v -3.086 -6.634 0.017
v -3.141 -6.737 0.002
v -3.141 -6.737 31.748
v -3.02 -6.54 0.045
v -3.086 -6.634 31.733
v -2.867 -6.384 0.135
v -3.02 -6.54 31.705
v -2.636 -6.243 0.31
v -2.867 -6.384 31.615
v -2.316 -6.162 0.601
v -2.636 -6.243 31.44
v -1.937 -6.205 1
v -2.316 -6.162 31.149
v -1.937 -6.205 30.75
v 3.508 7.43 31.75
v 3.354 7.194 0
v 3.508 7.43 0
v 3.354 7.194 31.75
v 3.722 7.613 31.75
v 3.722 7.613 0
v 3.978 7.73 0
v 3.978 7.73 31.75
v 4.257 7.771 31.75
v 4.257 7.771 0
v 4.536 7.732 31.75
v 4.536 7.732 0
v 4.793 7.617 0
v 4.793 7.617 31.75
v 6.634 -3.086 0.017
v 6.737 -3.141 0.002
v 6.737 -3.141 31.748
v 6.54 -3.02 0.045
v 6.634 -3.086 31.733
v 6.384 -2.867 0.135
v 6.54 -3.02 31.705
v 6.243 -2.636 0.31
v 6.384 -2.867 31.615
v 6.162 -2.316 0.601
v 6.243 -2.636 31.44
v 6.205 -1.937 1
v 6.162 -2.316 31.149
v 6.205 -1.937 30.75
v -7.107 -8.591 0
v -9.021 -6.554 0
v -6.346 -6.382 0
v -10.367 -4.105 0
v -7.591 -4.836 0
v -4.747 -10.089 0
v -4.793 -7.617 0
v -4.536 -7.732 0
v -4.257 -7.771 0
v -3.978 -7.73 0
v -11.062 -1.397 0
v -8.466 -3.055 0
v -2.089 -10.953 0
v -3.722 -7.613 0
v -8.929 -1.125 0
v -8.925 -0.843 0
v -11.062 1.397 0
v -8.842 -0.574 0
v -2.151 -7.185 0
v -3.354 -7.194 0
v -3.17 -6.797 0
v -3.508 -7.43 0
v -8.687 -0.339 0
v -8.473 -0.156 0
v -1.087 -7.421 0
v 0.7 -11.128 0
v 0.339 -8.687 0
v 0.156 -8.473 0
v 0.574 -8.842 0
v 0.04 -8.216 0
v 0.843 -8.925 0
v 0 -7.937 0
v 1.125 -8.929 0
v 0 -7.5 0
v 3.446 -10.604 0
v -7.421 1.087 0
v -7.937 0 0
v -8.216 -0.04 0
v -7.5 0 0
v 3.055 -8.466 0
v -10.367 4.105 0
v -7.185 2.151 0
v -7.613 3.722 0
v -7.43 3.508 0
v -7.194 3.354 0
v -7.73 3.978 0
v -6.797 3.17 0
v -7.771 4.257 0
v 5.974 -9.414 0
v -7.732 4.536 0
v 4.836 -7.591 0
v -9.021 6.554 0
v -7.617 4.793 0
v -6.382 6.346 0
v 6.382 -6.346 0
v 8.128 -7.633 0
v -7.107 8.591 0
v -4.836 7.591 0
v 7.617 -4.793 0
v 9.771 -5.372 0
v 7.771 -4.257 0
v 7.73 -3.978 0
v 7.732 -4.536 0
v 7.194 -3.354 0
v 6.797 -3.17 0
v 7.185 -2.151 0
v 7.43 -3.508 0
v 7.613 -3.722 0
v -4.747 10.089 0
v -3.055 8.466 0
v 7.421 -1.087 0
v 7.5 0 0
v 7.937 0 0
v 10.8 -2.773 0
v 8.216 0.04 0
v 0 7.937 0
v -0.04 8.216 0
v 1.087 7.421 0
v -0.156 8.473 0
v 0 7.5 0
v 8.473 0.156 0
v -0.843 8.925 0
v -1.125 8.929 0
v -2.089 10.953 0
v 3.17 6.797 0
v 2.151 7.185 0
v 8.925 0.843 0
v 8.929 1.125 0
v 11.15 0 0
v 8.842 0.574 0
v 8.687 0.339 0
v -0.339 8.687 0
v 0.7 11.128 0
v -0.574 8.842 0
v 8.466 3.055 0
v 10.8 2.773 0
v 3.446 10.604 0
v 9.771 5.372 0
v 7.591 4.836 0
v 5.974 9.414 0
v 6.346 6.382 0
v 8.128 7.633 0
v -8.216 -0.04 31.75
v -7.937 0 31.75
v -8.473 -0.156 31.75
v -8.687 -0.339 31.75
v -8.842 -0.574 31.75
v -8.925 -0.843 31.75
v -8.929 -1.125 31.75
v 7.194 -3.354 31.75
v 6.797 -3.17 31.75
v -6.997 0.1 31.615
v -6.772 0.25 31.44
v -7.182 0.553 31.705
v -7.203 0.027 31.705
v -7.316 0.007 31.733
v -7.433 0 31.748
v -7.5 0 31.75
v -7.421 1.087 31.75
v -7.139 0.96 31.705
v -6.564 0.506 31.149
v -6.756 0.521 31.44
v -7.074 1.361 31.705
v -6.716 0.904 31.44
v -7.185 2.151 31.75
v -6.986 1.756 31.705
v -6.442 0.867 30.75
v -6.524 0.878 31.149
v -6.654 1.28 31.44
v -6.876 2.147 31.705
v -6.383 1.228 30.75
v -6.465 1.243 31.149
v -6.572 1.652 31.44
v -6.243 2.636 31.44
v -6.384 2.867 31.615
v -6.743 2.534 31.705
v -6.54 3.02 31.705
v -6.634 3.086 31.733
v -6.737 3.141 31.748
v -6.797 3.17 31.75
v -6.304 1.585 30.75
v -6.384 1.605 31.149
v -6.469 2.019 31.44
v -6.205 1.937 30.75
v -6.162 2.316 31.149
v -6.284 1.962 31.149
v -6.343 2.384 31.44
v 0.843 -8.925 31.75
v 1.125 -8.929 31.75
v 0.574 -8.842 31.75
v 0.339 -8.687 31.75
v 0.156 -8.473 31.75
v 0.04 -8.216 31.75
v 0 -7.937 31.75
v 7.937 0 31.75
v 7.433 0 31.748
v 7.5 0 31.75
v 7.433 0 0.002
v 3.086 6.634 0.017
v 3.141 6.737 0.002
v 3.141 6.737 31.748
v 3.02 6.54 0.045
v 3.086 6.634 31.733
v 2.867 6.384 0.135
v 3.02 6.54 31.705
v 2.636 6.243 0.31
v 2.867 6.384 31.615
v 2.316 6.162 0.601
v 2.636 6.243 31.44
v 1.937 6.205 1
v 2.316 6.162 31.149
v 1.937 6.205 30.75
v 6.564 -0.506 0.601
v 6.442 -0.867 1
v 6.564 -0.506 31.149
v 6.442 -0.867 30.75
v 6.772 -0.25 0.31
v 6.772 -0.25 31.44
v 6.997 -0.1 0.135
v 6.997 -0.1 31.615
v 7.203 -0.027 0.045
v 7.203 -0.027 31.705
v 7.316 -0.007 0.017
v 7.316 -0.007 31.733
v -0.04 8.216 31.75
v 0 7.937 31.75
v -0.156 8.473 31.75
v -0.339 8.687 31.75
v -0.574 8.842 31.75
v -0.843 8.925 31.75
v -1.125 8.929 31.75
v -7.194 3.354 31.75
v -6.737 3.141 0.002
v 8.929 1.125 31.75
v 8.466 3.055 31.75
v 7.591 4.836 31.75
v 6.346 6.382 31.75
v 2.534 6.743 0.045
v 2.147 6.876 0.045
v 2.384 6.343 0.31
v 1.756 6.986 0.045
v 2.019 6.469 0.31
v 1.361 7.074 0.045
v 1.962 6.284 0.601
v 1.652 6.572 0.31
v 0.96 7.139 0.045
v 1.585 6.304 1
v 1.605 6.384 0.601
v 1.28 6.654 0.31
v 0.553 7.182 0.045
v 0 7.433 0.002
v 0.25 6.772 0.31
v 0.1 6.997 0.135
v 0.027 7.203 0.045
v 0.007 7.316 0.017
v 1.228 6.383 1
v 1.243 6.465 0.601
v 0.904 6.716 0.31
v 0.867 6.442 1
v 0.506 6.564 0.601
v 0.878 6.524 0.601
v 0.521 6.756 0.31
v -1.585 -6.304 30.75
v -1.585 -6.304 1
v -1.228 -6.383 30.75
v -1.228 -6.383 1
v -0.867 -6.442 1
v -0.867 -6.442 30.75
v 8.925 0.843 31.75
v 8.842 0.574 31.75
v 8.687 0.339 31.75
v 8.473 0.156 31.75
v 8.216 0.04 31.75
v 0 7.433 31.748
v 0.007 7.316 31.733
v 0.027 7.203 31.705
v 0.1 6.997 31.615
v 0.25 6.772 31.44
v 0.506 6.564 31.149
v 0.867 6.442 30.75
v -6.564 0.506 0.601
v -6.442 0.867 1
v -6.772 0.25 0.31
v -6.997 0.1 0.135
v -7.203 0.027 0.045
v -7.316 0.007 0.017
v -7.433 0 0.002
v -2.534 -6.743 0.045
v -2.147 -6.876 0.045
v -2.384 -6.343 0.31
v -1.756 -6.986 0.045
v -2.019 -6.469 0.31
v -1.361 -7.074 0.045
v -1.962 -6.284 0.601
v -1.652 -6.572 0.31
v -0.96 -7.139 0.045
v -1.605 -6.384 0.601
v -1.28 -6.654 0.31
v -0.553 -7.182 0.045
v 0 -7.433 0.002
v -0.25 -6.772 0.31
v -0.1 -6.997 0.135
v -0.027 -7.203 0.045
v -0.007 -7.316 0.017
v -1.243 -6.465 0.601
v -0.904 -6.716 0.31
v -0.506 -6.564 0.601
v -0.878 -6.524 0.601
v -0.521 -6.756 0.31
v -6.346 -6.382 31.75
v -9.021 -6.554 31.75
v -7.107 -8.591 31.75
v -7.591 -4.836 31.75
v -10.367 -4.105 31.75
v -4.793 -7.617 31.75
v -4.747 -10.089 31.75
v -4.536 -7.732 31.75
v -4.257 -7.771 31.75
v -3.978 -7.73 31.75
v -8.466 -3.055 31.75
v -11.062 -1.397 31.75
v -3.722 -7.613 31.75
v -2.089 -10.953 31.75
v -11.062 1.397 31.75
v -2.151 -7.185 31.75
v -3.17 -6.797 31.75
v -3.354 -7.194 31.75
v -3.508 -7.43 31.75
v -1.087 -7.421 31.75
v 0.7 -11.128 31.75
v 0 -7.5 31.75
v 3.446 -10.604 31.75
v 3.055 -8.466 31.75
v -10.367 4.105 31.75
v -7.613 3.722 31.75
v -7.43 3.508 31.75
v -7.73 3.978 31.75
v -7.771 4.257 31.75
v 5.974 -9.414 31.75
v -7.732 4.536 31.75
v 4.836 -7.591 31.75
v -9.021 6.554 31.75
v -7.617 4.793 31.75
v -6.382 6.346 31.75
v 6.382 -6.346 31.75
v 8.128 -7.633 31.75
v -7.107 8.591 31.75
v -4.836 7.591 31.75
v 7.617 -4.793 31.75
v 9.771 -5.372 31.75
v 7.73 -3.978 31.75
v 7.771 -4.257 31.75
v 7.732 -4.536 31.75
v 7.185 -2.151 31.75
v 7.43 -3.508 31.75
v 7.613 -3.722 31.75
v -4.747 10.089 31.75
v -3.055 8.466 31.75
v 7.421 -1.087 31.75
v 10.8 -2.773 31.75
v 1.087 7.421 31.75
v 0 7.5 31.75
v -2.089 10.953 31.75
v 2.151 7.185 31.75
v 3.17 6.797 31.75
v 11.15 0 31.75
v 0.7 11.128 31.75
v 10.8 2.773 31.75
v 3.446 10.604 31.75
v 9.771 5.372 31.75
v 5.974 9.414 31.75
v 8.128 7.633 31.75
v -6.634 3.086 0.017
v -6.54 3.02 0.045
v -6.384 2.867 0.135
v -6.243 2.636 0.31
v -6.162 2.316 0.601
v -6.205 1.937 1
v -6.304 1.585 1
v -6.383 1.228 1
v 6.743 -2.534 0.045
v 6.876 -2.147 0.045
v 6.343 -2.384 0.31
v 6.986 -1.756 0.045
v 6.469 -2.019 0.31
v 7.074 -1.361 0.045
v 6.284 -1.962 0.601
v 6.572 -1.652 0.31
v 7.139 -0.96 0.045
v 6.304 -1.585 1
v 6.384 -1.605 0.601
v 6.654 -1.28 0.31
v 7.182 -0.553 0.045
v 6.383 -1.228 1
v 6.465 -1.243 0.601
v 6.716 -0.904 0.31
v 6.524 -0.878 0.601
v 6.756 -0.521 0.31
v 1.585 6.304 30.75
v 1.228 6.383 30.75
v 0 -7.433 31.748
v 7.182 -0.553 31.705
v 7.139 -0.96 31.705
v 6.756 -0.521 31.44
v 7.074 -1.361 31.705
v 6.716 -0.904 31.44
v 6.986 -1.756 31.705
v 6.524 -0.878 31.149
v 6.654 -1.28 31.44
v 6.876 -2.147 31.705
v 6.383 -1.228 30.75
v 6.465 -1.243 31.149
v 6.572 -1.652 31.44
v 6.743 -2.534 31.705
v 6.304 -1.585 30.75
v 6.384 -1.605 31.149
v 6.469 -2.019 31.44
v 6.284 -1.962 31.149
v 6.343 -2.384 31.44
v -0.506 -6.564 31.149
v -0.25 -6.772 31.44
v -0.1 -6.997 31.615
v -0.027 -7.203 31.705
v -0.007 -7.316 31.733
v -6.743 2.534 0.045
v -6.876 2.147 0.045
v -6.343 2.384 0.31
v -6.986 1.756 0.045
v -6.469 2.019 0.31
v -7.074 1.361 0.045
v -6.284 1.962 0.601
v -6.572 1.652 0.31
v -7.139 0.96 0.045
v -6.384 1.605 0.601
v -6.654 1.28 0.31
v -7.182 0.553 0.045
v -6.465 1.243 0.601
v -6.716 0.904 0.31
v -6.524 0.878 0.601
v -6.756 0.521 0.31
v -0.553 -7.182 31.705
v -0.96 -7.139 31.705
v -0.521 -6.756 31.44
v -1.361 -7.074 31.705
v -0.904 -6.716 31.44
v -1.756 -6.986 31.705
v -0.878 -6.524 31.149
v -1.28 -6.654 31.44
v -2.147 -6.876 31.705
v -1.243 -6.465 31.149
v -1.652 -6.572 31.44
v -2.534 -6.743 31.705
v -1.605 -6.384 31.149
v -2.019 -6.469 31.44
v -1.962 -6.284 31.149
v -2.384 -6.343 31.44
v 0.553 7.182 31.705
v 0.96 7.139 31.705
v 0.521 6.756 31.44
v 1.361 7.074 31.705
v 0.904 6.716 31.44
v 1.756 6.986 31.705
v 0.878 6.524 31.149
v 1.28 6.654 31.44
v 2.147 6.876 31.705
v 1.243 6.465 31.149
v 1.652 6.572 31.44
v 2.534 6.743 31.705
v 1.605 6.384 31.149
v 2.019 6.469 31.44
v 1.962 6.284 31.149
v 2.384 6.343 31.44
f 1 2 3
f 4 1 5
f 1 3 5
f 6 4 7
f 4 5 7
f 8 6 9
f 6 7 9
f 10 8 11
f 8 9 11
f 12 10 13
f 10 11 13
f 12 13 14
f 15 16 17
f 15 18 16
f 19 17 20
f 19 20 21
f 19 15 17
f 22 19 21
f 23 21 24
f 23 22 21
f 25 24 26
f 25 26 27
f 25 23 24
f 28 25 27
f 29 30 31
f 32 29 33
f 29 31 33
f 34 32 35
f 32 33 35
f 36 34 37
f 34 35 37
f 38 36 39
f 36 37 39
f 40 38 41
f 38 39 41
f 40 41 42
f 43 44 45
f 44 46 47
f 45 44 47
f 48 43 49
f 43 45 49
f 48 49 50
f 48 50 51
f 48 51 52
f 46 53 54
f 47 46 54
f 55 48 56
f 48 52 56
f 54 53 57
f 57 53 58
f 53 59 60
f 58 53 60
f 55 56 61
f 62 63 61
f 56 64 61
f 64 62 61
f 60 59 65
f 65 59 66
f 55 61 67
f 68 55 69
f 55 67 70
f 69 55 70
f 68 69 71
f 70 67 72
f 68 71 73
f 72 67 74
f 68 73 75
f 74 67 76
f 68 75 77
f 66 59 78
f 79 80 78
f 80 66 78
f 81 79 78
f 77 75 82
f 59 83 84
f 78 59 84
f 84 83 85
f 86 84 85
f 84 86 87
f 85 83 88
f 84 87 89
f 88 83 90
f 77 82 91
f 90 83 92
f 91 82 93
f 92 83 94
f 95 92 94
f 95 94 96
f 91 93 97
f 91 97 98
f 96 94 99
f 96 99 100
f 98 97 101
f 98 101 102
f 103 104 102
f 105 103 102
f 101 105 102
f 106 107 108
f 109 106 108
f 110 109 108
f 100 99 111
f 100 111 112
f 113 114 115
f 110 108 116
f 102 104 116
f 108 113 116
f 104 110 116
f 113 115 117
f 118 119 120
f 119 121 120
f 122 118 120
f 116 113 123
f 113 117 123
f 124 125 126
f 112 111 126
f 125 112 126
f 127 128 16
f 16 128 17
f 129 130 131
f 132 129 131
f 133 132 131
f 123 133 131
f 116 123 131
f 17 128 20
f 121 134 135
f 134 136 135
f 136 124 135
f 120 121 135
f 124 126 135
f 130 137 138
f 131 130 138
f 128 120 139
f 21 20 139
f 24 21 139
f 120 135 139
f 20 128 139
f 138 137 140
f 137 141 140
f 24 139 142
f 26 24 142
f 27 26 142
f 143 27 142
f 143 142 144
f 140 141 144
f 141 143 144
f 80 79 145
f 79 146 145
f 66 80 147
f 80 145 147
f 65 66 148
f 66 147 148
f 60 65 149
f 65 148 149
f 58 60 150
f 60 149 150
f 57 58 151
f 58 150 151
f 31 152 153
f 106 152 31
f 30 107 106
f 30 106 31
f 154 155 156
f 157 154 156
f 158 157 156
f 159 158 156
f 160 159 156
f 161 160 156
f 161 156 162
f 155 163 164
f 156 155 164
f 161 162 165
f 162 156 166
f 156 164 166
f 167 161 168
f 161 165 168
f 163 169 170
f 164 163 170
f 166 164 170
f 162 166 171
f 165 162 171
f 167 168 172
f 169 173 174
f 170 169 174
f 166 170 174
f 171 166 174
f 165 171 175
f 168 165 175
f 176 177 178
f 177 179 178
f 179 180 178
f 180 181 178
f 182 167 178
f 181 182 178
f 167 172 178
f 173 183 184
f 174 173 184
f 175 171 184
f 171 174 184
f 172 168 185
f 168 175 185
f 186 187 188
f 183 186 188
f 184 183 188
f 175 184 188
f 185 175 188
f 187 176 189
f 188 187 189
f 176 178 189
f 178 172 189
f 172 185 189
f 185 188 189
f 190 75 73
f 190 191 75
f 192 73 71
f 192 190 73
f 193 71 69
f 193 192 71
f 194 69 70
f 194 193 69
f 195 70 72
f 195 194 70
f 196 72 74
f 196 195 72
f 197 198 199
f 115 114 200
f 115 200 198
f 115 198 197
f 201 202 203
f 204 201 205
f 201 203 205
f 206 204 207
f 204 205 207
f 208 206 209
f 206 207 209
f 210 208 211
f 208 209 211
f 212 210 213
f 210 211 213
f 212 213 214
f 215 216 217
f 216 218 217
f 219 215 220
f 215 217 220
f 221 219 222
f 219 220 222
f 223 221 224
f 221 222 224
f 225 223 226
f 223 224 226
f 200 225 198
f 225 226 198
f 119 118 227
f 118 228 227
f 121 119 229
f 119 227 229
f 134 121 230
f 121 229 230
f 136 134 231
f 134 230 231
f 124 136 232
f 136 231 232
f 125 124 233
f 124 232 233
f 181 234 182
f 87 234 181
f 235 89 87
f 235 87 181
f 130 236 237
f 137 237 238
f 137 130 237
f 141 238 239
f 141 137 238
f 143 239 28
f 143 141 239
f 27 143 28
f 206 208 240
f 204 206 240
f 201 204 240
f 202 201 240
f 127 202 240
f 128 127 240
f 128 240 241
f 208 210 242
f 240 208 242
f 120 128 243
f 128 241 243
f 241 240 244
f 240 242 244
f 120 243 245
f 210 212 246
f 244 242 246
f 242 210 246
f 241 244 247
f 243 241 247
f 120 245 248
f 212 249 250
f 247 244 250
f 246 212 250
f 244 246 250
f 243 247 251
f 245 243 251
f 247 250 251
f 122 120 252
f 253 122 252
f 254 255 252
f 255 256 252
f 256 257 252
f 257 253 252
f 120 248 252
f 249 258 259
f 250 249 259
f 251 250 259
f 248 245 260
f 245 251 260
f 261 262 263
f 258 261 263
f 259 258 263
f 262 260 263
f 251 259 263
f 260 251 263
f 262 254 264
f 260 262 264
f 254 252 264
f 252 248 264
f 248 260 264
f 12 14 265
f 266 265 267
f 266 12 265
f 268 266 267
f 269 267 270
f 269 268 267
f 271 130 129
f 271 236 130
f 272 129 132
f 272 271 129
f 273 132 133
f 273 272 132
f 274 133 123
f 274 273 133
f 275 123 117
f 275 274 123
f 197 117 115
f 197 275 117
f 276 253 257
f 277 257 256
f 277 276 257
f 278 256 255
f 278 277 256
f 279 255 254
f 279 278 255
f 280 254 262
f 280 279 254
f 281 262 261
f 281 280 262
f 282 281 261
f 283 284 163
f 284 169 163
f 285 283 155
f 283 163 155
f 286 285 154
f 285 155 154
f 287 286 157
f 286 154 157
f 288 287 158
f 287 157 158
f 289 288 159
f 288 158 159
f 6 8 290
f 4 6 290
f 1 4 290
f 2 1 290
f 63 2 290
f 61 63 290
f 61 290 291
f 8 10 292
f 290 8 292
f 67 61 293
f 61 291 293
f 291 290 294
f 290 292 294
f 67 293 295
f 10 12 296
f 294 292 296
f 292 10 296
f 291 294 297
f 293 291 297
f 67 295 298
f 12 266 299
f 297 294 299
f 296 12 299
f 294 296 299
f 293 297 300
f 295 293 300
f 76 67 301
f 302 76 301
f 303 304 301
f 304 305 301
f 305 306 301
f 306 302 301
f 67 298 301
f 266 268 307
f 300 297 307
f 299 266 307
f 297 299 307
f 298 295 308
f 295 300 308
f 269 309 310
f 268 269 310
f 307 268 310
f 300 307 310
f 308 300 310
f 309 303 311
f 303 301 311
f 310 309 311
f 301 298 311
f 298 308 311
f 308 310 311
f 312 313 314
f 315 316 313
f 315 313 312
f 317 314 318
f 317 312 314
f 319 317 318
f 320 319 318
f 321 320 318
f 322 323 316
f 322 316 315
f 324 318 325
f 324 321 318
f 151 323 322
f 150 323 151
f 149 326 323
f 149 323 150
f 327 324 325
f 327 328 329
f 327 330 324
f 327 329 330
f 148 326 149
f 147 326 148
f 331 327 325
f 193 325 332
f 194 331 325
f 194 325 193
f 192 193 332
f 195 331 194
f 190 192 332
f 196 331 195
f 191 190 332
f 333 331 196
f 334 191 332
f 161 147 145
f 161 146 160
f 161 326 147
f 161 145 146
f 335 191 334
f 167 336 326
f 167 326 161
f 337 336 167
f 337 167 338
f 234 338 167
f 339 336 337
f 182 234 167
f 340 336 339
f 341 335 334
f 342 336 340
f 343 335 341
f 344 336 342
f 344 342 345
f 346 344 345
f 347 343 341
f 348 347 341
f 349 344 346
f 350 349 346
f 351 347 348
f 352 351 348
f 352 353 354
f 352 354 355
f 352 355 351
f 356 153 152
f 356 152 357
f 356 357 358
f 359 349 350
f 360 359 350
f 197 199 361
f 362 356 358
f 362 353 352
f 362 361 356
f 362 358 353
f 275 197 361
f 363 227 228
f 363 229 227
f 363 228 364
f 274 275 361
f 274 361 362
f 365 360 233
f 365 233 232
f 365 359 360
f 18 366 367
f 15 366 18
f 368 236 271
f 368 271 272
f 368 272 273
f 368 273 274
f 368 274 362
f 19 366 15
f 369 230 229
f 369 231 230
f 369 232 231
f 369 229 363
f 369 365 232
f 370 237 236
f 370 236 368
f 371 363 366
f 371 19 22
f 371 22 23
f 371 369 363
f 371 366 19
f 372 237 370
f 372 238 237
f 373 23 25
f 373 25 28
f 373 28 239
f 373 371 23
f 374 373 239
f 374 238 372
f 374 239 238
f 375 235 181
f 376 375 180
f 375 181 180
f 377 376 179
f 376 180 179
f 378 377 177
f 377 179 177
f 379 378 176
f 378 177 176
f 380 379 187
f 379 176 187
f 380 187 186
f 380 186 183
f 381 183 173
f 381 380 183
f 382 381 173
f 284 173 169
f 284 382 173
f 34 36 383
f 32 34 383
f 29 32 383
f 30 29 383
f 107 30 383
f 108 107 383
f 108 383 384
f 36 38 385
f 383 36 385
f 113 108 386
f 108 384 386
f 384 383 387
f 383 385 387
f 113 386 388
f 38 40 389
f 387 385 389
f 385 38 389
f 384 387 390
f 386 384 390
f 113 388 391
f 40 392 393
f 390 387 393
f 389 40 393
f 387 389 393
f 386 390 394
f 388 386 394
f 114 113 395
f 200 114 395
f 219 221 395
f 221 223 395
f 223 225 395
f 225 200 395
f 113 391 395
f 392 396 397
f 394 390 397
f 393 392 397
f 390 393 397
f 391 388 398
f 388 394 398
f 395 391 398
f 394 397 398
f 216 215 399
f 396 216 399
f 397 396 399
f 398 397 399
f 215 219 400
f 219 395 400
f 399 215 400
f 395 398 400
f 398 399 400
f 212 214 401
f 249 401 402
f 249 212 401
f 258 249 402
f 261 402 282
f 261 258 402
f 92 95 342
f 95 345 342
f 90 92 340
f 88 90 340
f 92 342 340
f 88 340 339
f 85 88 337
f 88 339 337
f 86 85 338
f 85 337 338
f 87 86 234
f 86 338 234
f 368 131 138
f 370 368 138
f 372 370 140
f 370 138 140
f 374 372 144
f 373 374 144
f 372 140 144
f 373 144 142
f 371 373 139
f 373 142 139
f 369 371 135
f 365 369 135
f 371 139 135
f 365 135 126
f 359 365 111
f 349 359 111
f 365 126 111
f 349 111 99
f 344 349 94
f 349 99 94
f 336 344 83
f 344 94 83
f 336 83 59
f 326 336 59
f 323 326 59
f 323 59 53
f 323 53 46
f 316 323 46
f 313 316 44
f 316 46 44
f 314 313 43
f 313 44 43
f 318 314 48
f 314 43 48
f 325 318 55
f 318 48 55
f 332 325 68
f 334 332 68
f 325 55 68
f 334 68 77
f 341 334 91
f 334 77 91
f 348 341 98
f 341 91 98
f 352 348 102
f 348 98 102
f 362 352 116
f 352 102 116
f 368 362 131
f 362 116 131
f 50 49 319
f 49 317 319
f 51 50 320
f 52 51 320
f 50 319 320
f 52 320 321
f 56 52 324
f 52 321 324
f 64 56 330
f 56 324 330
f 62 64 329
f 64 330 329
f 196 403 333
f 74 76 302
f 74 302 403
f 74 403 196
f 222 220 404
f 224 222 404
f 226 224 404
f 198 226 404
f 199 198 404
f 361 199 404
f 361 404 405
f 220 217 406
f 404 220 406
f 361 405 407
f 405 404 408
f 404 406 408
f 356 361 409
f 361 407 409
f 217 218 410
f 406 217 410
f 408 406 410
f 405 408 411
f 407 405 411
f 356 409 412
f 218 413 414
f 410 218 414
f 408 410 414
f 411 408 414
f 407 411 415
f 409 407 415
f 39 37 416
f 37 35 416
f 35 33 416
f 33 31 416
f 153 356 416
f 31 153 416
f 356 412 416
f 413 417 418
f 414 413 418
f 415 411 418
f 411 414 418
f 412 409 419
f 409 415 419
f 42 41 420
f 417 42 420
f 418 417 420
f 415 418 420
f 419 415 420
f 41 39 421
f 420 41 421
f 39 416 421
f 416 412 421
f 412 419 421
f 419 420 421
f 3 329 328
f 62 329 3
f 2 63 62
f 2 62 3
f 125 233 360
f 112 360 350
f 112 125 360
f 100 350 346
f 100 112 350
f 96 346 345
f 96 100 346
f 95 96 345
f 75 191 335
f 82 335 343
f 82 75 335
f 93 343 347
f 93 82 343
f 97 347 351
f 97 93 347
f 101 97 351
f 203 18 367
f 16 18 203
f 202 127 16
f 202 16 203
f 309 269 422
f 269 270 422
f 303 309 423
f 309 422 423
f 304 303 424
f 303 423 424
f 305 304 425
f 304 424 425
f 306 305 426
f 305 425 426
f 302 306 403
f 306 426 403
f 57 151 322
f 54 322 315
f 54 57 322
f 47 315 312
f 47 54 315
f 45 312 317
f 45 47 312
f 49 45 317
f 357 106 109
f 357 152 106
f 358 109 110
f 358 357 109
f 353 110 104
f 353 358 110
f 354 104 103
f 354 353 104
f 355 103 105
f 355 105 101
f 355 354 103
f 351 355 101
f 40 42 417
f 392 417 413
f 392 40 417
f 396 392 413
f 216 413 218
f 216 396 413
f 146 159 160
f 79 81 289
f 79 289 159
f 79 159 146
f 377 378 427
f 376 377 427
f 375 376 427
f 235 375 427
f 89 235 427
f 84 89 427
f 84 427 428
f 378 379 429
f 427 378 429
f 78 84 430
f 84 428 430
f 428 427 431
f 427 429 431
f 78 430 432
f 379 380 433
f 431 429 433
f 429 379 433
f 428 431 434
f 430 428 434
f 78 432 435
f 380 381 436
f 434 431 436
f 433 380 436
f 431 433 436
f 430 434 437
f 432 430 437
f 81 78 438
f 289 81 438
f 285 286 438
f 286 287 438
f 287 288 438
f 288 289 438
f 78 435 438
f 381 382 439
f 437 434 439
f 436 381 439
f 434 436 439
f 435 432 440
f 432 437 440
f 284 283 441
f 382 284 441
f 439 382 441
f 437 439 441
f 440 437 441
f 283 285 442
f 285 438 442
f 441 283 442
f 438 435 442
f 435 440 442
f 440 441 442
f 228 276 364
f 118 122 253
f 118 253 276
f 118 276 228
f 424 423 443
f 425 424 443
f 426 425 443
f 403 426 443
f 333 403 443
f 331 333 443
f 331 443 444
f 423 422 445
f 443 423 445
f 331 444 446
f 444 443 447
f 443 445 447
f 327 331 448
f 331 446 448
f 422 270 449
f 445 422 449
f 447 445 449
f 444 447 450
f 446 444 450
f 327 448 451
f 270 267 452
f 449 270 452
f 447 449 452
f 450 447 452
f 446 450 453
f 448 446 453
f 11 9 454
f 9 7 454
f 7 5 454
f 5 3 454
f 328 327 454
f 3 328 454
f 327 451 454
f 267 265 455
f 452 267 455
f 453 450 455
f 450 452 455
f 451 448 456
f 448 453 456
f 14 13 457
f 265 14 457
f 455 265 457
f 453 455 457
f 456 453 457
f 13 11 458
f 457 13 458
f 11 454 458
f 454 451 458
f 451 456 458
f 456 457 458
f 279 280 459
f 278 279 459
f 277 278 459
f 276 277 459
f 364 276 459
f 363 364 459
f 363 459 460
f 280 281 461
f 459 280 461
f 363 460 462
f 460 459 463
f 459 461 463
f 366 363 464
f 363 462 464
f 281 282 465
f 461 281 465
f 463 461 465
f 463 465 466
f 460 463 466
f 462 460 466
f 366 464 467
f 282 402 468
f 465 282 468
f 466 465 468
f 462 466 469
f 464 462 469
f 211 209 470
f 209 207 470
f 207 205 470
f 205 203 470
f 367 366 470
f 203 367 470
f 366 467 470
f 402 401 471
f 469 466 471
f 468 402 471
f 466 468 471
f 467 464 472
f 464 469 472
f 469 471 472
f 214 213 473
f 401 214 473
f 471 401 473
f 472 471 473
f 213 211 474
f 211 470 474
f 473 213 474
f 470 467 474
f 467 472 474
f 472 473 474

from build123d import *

# Parameters (mm, degrees)
SKETCH1_R           = 11.15
BOSS_EXTRUDE1_DEPTH = 31.75
CUT_EXTRUDE4_DEPTH  = 36.450070522
FILLET2_R           = 1
FILLET4_R           = 1


with BuildPart() as part:
    # Sketch1 → Boss-Extrude1 (new body)
    with BuildSketch(Plane.XY):
        Circle(SKETCH1_R)
    extrude(amount=BOSS_EXTRUDE1_DEPTH)

    # Sketch2 → Cut-Extrude4 (cut, through all)
    with BuildSketch(Plane.XY):
        with BuildLine():
            Line((0, 6.5), (0, 9))
            ThreePointArc((0, 9), (-4.835696475, 7.590523012), (-8.156770083, 3.803564356))
            Line((-8.156770083, 3.803564356), (-5.891000616, 2.747018701))
            ThreePointArc((-5.891000616, 2.747018701), (-6.345924046, 1.406857491), (-6.5, 0))
            Line((-6.5, 0), (-9, 0))
            ThreePointArc((-9, 0), (-7.590523012, -4.835696475), (-3.803564356, -8.156770083))
            Line((-3.803564356, -8.156770083), (-2.747018701, -5.891000616))
            ThreePointArc((-2.747018701, -5.891000616), (-1.406857491, -6.345924046), (0, -6.5))
            Line((0, -6.5), (0, -9))
            ThreePointArc((0, -9), (4.835696475, -7.590523012), (8.156770083, -3.803564356))
            Line((8.156770083, -3.803564356), (5.891000616, -2.747018701))
            ThreePointArc((5.891000616, -2.747018701), (6.345924046, -1.406857491), (6.5, 0))
            Line((6.5, 0), (9, 0))
            ThreePointArc((9, 0), (7.590523012, 4.835696475), (3.803564356, 8.156770083))
            Line((3.803564356, 8.156770083), (2.747018701, 5.891000616))
            ThreePointArc((2.747018701, 5.891000616), (1.406857491, 6.345924046), (0, 6.5))
        make_face()
    extrude(amount=CUT_EXTRUDE4_DEPTH, mode=Mode.SUBTRACT)

    # Fillet2
    fillet2_edges = [part.edges().sort_by_distance(p)[0] for p in [
        (6.345924046, -1.406857491, 0),
        (5.891000616, -2.747018701, 15.875),
        (6.5, 0, 15.875),
        (1.406857491, 6.345924046, 0),
        (2.747018701, 5.891000616, 15.875),
        (0, 6.5, 15.875),
        (-6.345924046, 1.406857491, 0),
        (-5.891000616, 2.747018701, 15.875),
        (-6.5, 0, 15.875),
        (-1.406857491, -6.345924046, 0),
        (-2.747018701, -5.891000616, 15.875),
        (0, -6.5, 15.875),
        (6.345924046, -1.406857491, 31.75),
        (1.406857491, 6.345924046, 31.75),
        (-6.345924046, 1.406857491, 31.75),
        (-1.406857491, -6.345924046, 31.75),
    ]]
    fillet(fillet2_edges, radius=FILLET2_R)

    # Fillet4
    fillet4_edges = [part.edges().sort_by_distance(p)[0] for p in [
        (9, 0, 15.875),
        (3.803564356, 8.156770083, 15.875),
        (0, 9, 15.875),
        (-8.156770083, 3.803564356, 15.875),
        (-9, 0, 15.875),
        (-3.803564356, -8.156770083, 15.875),
        (0, -9, 15.875),
        (8.156770083, -3.803564356, 15.875),
    ]]
    fillet(fillet4_edges, radius=FILLET4_R)


solid = part.part
